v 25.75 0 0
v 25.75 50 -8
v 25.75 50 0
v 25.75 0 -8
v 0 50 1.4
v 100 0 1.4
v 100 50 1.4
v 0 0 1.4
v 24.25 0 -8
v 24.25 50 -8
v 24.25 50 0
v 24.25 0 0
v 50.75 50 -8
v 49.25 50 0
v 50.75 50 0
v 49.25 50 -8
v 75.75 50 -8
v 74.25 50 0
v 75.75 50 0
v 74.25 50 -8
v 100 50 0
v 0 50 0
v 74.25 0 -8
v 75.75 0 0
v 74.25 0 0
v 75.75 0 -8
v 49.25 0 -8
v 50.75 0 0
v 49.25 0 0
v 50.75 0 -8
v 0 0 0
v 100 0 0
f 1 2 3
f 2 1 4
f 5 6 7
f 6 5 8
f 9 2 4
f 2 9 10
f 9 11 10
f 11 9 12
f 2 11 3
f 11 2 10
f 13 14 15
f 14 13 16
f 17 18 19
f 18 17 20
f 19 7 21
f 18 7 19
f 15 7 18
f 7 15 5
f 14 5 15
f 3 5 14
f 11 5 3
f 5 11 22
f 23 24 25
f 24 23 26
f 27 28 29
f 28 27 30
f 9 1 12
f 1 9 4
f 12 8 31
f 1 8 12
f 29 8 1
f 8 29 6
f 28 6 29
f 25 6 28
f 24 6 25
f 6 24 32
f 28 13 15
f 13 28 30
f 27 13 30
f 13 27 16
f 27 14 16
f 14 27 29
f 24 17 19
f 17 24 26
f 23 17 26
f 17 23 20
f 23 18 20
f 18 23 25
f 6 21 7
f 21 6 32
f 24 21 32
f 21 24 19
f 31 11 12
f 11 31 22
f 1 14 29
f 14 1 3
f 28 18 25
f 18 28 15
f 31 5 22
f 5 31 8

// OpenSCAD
$fn = 32;

// ----------------------------------------------------------------------
// Ribbed panel: 1.4 mm panel
// ----------------------------------------------------------------------

// --- parameters (mm) ---
panel_l = 100;            // panel length, X
panel_w = 50;             // panel width, Y
panel_t = 1.4;            // panel thickness, Z
rib_t = 1.5;              // rib thickness
rib_h = 8;                // rib height below the panel
ribs = 3;                 // number of ribs
fit_tol = 0.1;            // tolerance for press fits, mm
free_tol = 0.3;           // tolerance for clearance fits, mm

total_h = panel_t + rib_h;  // overall height

union() {
  cube([panel_l, panel_w, panel_t]);
  for (i = [1 : ribs])
    translate([i * panel_l / (ribs + 1) - rib_t / 2, 0, -rib_h])
      cube([rib_t, panel_w, rib_h + panel_t]);
}
